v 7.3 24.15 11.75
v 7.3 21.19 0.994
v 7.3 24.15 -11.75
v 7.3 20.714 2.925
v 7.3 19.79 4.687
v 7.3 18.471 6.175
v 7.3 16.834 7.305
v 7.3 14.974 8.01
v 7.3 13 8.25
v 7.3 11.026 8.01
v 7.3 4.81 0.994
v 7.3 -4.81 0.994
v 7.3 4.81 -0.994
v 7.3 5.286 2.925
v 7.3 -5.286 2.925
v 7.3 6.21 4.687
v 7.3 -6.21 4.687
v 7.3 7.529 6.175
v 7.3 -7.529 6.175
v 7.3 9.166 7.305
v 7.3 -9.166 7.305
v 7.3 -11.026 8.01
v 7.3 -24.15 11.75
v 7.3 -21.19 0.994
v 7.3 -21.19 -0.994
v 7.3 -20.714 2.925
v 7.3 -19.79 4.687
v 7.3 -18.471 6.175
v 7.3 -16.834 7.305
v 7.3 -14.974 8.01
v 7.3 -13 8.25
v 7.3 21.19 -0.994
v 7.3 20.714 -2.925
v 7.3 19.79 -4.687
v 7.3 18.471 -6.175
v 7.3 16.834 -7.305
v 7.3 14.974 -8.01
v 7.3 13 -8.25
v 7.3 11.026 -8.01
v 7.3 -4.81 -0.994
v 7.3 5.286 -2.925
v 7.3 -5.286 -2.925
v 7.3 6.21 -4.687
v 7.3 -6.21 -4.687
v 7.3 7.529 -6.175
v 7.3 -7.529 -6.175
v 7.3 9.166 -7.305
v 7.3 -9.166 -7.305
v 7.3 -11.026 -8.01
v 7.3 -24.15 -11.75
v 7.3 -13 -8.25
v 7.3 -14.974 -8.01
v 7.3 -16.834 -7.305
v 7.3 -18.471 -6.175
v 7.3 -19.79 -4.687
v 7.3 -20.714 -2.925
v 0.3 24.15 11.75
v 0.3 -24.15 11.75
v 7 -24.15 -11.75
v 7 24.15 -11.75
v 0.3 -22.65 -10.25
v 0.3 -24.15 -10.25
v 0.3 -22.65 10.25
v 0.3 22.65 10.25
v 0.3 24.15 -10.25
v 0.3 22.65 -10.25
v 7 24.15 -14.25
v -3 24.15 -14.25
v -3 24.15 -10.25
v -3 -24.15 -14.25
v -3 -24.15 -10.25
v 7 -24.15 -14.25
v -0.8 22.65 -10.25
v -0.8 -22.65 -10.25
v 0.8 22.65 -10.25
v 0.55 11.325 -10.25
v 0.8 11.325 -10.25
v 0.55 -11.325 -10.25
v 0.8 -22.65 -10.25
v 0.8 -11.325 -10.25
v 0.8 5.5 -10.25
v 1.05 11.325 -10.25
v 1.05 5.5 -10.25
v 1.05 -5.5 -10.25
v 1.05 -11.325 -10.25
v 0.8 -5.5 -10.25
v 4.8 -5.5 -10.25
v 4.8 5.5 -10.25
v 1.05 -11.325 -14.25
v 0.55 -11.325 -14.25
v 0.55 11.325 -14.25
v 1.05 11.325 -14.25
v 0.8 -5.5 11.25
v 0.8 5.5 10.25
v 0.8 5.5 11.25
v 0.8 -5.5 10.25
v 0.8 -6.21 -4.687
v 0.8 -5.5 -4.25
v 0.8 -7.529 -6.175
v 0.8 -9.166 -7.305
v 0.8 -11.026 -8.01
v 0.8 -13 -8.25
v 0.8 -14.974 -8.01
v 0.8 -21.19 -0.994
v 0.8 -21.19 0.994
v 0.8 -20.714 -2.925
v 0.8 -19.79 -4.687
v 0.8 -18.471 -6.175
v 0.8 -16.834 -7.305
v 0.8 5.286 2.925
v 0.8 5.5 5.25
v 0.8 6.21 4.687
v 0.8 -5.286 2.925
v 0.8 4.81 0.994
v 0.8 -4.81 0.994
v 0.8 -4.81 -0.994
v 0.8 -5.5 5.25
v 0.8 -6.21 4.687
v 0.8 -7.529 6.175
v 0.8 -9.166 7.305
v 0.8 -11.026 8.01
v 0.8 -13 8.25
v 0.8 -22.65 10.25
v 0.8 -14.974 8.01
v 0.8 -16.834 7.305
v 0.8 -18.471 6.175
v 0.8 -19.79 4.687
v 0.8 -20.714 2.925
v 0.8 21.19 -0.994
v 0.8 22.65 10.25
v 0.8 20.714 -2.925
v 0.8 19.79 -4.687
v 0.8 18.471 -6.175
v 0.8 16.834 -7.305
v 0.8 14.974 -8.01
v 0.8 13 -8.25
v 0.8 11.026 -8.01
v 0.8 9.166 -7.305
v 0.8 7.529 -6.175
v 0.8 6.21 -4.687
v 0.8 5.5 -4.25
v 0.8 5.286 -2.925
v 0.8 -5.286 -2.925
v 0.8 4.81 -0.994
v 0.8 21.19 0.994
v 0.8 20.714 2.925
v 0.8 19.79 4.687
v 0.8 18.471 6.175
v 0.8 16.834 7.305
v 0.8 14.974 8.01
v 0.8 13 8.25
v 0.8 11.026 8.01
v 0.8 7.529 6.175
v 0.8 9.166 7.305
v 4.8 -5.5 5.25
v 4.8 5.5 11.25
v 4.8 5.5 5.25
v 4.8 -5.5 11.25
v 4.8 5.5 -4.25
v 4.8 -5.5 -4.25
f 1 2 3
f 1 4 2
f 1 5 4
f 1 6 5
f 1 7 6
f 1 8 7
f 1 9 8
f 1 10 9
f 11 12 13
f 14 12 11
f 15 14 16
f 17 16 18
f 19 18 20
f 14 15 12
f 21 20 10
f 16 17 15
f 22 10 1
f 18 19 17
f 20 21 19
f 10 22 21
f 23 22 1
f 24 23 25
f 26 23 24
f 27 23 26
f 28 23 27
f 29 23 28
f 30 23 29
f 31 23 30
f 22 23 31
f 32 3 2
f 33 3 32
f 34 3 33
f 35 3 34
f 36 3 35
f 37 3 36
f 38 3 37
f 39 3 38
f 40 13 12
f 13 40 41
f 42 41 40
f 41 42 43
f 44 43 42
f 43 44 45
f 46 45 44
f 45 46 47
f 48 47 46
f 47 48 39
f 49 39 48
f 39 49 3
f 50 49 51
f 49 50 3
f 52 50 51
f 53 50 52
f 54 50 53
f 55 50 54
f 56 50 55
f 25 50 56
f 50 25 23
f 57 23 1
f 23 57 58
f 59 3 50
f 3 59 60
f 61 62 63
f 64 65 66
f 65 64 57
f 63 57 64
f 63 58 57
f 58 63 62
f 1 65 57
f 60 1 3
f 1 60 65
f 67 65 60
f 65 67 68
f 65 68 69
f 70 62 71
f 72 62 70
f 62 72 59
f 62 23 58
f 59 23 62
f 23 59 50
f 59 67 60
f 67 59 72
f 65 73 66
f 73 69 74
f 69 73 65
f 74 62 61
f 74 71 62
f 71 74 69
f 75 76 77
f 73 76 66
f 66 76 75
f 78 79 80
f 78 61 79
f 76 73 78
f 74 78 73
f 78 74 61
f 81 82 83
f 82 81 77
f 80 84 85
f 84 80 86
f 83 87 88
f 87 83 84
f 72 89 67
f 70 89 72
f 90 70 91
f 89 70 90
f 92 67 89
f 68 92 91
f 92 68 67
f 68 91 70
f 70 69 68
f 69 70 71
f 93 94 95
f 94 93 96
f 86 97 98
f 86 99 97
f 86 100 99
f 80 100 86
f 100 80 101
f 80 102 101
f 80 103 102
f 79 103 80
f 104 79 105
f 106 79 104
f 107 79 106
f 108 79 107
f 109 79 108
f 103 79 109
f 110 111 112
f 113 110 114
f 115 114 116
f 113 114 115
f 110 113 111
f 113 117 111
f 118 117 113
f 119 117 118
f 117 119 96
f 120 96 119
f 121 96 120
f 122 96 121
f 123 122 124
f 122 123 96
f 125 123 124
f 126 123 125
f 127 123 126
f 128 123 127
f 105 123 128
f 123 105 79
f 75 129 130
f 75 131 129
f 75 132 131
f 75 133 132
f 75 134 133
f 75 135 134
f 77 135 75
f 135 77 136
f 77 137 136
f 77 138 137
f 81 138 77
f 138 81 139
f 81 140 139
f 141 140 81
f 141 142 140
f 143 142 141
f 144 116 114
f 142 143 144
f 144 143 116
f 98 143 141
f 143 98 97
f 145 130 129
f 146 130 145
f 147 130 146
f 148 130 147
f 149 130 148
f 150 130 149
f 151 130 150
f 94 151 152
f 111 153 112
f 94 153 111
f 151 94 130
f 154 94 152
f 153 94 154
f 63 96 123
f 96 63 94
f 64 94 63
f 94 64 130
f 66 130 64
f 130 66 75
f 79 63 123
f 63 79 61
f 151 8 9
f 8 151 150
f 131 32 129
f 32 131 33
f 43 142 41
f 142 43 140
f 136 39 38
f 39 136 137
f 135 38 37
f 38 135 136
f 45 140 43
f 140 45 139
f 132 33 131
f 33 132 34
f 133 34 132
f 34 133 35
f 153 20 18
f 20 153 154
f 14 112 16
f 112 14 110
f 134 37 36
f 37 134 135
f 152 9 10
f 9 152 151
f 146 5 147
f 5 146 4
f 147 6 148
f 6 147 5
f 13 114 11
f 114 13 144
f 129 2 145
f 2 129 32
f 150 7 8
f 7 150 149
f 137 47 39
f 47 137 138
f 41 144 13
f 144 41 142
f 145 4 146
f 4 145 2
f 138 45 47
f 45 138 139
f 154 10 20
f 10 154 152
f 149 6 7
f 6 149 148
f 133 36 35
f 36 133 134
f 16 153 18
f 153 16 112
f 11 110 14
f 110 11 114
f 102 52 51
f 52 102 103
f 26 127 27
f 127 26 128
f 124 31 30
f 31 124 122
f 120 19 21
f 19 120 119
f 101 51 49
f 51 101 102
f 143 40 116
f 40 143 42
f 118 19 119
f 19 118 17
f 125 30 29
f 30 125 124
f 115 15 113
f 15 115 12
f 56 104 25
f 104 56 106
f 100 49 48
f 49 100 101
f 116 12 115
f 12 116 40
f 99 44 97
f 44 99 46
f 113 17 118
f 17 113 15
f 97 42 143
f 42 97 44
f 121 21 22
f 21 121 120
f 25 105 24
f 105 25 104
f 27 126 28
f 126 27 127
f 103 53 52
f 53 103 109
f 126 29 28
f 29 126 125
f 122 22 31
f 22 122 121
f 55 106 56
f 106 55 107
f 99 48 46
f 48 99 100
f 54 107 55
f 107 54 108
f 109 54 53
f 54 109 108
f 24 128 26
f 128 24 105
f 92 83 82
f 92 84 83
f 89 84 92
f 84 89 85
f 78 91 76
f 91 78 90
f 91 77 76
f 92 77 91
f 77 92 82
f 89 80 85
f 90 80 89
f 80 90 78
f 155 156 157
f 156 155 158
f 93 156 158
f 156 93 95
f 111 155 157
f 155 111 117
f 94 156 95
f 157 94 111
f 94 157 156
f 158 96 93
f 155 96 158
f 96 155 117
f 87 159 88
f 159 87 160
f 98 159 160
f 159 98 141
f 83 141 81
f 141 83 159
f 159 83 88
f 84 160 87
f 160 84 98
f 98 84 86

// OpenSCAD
pcbx=1.60;	// grosor pcb
pcby=45.30;	// largo pcb
pcbz=20.50;	// alto pcb

distanciasensores=26;
grosorbase=4;

module cilindro(){
translate([3,0,0])
rotate([0,90,0])	
cylinder(d=(20.50-4), h=12, center=true);
}

difference(){
union(){
translate([pcbx/2+3,0,0])	cube ([7,pcby+3,pcbz+3], center=true); //frontal

translate([2,0,-pcbz/2-grosorbase/2])	cube([10,pcby+3,grosorbase],center=true); //base
}
// ranura
translate([pcbx/2,0,-pcbz/2-grosorbase/2])	cube([0.5,pcby/2,grosorbase],center=true);

// cristal y conector
translate([pcbx/2+4/2,0,pcbz/2-2])		cube([4,11,6],center=true);
translate([pcbx/2+4/2,0,-pcbz/2+6/2])	cube([4,11,6],center=true);

union(){		// PING
cube([pcbx,pcby,pcbz], center=true);	// pcb block 
translate([0,distanciasensores/2,0])	cilindro();
translate([0,-distanciasensores/2,0])	cilindro();
}
}
